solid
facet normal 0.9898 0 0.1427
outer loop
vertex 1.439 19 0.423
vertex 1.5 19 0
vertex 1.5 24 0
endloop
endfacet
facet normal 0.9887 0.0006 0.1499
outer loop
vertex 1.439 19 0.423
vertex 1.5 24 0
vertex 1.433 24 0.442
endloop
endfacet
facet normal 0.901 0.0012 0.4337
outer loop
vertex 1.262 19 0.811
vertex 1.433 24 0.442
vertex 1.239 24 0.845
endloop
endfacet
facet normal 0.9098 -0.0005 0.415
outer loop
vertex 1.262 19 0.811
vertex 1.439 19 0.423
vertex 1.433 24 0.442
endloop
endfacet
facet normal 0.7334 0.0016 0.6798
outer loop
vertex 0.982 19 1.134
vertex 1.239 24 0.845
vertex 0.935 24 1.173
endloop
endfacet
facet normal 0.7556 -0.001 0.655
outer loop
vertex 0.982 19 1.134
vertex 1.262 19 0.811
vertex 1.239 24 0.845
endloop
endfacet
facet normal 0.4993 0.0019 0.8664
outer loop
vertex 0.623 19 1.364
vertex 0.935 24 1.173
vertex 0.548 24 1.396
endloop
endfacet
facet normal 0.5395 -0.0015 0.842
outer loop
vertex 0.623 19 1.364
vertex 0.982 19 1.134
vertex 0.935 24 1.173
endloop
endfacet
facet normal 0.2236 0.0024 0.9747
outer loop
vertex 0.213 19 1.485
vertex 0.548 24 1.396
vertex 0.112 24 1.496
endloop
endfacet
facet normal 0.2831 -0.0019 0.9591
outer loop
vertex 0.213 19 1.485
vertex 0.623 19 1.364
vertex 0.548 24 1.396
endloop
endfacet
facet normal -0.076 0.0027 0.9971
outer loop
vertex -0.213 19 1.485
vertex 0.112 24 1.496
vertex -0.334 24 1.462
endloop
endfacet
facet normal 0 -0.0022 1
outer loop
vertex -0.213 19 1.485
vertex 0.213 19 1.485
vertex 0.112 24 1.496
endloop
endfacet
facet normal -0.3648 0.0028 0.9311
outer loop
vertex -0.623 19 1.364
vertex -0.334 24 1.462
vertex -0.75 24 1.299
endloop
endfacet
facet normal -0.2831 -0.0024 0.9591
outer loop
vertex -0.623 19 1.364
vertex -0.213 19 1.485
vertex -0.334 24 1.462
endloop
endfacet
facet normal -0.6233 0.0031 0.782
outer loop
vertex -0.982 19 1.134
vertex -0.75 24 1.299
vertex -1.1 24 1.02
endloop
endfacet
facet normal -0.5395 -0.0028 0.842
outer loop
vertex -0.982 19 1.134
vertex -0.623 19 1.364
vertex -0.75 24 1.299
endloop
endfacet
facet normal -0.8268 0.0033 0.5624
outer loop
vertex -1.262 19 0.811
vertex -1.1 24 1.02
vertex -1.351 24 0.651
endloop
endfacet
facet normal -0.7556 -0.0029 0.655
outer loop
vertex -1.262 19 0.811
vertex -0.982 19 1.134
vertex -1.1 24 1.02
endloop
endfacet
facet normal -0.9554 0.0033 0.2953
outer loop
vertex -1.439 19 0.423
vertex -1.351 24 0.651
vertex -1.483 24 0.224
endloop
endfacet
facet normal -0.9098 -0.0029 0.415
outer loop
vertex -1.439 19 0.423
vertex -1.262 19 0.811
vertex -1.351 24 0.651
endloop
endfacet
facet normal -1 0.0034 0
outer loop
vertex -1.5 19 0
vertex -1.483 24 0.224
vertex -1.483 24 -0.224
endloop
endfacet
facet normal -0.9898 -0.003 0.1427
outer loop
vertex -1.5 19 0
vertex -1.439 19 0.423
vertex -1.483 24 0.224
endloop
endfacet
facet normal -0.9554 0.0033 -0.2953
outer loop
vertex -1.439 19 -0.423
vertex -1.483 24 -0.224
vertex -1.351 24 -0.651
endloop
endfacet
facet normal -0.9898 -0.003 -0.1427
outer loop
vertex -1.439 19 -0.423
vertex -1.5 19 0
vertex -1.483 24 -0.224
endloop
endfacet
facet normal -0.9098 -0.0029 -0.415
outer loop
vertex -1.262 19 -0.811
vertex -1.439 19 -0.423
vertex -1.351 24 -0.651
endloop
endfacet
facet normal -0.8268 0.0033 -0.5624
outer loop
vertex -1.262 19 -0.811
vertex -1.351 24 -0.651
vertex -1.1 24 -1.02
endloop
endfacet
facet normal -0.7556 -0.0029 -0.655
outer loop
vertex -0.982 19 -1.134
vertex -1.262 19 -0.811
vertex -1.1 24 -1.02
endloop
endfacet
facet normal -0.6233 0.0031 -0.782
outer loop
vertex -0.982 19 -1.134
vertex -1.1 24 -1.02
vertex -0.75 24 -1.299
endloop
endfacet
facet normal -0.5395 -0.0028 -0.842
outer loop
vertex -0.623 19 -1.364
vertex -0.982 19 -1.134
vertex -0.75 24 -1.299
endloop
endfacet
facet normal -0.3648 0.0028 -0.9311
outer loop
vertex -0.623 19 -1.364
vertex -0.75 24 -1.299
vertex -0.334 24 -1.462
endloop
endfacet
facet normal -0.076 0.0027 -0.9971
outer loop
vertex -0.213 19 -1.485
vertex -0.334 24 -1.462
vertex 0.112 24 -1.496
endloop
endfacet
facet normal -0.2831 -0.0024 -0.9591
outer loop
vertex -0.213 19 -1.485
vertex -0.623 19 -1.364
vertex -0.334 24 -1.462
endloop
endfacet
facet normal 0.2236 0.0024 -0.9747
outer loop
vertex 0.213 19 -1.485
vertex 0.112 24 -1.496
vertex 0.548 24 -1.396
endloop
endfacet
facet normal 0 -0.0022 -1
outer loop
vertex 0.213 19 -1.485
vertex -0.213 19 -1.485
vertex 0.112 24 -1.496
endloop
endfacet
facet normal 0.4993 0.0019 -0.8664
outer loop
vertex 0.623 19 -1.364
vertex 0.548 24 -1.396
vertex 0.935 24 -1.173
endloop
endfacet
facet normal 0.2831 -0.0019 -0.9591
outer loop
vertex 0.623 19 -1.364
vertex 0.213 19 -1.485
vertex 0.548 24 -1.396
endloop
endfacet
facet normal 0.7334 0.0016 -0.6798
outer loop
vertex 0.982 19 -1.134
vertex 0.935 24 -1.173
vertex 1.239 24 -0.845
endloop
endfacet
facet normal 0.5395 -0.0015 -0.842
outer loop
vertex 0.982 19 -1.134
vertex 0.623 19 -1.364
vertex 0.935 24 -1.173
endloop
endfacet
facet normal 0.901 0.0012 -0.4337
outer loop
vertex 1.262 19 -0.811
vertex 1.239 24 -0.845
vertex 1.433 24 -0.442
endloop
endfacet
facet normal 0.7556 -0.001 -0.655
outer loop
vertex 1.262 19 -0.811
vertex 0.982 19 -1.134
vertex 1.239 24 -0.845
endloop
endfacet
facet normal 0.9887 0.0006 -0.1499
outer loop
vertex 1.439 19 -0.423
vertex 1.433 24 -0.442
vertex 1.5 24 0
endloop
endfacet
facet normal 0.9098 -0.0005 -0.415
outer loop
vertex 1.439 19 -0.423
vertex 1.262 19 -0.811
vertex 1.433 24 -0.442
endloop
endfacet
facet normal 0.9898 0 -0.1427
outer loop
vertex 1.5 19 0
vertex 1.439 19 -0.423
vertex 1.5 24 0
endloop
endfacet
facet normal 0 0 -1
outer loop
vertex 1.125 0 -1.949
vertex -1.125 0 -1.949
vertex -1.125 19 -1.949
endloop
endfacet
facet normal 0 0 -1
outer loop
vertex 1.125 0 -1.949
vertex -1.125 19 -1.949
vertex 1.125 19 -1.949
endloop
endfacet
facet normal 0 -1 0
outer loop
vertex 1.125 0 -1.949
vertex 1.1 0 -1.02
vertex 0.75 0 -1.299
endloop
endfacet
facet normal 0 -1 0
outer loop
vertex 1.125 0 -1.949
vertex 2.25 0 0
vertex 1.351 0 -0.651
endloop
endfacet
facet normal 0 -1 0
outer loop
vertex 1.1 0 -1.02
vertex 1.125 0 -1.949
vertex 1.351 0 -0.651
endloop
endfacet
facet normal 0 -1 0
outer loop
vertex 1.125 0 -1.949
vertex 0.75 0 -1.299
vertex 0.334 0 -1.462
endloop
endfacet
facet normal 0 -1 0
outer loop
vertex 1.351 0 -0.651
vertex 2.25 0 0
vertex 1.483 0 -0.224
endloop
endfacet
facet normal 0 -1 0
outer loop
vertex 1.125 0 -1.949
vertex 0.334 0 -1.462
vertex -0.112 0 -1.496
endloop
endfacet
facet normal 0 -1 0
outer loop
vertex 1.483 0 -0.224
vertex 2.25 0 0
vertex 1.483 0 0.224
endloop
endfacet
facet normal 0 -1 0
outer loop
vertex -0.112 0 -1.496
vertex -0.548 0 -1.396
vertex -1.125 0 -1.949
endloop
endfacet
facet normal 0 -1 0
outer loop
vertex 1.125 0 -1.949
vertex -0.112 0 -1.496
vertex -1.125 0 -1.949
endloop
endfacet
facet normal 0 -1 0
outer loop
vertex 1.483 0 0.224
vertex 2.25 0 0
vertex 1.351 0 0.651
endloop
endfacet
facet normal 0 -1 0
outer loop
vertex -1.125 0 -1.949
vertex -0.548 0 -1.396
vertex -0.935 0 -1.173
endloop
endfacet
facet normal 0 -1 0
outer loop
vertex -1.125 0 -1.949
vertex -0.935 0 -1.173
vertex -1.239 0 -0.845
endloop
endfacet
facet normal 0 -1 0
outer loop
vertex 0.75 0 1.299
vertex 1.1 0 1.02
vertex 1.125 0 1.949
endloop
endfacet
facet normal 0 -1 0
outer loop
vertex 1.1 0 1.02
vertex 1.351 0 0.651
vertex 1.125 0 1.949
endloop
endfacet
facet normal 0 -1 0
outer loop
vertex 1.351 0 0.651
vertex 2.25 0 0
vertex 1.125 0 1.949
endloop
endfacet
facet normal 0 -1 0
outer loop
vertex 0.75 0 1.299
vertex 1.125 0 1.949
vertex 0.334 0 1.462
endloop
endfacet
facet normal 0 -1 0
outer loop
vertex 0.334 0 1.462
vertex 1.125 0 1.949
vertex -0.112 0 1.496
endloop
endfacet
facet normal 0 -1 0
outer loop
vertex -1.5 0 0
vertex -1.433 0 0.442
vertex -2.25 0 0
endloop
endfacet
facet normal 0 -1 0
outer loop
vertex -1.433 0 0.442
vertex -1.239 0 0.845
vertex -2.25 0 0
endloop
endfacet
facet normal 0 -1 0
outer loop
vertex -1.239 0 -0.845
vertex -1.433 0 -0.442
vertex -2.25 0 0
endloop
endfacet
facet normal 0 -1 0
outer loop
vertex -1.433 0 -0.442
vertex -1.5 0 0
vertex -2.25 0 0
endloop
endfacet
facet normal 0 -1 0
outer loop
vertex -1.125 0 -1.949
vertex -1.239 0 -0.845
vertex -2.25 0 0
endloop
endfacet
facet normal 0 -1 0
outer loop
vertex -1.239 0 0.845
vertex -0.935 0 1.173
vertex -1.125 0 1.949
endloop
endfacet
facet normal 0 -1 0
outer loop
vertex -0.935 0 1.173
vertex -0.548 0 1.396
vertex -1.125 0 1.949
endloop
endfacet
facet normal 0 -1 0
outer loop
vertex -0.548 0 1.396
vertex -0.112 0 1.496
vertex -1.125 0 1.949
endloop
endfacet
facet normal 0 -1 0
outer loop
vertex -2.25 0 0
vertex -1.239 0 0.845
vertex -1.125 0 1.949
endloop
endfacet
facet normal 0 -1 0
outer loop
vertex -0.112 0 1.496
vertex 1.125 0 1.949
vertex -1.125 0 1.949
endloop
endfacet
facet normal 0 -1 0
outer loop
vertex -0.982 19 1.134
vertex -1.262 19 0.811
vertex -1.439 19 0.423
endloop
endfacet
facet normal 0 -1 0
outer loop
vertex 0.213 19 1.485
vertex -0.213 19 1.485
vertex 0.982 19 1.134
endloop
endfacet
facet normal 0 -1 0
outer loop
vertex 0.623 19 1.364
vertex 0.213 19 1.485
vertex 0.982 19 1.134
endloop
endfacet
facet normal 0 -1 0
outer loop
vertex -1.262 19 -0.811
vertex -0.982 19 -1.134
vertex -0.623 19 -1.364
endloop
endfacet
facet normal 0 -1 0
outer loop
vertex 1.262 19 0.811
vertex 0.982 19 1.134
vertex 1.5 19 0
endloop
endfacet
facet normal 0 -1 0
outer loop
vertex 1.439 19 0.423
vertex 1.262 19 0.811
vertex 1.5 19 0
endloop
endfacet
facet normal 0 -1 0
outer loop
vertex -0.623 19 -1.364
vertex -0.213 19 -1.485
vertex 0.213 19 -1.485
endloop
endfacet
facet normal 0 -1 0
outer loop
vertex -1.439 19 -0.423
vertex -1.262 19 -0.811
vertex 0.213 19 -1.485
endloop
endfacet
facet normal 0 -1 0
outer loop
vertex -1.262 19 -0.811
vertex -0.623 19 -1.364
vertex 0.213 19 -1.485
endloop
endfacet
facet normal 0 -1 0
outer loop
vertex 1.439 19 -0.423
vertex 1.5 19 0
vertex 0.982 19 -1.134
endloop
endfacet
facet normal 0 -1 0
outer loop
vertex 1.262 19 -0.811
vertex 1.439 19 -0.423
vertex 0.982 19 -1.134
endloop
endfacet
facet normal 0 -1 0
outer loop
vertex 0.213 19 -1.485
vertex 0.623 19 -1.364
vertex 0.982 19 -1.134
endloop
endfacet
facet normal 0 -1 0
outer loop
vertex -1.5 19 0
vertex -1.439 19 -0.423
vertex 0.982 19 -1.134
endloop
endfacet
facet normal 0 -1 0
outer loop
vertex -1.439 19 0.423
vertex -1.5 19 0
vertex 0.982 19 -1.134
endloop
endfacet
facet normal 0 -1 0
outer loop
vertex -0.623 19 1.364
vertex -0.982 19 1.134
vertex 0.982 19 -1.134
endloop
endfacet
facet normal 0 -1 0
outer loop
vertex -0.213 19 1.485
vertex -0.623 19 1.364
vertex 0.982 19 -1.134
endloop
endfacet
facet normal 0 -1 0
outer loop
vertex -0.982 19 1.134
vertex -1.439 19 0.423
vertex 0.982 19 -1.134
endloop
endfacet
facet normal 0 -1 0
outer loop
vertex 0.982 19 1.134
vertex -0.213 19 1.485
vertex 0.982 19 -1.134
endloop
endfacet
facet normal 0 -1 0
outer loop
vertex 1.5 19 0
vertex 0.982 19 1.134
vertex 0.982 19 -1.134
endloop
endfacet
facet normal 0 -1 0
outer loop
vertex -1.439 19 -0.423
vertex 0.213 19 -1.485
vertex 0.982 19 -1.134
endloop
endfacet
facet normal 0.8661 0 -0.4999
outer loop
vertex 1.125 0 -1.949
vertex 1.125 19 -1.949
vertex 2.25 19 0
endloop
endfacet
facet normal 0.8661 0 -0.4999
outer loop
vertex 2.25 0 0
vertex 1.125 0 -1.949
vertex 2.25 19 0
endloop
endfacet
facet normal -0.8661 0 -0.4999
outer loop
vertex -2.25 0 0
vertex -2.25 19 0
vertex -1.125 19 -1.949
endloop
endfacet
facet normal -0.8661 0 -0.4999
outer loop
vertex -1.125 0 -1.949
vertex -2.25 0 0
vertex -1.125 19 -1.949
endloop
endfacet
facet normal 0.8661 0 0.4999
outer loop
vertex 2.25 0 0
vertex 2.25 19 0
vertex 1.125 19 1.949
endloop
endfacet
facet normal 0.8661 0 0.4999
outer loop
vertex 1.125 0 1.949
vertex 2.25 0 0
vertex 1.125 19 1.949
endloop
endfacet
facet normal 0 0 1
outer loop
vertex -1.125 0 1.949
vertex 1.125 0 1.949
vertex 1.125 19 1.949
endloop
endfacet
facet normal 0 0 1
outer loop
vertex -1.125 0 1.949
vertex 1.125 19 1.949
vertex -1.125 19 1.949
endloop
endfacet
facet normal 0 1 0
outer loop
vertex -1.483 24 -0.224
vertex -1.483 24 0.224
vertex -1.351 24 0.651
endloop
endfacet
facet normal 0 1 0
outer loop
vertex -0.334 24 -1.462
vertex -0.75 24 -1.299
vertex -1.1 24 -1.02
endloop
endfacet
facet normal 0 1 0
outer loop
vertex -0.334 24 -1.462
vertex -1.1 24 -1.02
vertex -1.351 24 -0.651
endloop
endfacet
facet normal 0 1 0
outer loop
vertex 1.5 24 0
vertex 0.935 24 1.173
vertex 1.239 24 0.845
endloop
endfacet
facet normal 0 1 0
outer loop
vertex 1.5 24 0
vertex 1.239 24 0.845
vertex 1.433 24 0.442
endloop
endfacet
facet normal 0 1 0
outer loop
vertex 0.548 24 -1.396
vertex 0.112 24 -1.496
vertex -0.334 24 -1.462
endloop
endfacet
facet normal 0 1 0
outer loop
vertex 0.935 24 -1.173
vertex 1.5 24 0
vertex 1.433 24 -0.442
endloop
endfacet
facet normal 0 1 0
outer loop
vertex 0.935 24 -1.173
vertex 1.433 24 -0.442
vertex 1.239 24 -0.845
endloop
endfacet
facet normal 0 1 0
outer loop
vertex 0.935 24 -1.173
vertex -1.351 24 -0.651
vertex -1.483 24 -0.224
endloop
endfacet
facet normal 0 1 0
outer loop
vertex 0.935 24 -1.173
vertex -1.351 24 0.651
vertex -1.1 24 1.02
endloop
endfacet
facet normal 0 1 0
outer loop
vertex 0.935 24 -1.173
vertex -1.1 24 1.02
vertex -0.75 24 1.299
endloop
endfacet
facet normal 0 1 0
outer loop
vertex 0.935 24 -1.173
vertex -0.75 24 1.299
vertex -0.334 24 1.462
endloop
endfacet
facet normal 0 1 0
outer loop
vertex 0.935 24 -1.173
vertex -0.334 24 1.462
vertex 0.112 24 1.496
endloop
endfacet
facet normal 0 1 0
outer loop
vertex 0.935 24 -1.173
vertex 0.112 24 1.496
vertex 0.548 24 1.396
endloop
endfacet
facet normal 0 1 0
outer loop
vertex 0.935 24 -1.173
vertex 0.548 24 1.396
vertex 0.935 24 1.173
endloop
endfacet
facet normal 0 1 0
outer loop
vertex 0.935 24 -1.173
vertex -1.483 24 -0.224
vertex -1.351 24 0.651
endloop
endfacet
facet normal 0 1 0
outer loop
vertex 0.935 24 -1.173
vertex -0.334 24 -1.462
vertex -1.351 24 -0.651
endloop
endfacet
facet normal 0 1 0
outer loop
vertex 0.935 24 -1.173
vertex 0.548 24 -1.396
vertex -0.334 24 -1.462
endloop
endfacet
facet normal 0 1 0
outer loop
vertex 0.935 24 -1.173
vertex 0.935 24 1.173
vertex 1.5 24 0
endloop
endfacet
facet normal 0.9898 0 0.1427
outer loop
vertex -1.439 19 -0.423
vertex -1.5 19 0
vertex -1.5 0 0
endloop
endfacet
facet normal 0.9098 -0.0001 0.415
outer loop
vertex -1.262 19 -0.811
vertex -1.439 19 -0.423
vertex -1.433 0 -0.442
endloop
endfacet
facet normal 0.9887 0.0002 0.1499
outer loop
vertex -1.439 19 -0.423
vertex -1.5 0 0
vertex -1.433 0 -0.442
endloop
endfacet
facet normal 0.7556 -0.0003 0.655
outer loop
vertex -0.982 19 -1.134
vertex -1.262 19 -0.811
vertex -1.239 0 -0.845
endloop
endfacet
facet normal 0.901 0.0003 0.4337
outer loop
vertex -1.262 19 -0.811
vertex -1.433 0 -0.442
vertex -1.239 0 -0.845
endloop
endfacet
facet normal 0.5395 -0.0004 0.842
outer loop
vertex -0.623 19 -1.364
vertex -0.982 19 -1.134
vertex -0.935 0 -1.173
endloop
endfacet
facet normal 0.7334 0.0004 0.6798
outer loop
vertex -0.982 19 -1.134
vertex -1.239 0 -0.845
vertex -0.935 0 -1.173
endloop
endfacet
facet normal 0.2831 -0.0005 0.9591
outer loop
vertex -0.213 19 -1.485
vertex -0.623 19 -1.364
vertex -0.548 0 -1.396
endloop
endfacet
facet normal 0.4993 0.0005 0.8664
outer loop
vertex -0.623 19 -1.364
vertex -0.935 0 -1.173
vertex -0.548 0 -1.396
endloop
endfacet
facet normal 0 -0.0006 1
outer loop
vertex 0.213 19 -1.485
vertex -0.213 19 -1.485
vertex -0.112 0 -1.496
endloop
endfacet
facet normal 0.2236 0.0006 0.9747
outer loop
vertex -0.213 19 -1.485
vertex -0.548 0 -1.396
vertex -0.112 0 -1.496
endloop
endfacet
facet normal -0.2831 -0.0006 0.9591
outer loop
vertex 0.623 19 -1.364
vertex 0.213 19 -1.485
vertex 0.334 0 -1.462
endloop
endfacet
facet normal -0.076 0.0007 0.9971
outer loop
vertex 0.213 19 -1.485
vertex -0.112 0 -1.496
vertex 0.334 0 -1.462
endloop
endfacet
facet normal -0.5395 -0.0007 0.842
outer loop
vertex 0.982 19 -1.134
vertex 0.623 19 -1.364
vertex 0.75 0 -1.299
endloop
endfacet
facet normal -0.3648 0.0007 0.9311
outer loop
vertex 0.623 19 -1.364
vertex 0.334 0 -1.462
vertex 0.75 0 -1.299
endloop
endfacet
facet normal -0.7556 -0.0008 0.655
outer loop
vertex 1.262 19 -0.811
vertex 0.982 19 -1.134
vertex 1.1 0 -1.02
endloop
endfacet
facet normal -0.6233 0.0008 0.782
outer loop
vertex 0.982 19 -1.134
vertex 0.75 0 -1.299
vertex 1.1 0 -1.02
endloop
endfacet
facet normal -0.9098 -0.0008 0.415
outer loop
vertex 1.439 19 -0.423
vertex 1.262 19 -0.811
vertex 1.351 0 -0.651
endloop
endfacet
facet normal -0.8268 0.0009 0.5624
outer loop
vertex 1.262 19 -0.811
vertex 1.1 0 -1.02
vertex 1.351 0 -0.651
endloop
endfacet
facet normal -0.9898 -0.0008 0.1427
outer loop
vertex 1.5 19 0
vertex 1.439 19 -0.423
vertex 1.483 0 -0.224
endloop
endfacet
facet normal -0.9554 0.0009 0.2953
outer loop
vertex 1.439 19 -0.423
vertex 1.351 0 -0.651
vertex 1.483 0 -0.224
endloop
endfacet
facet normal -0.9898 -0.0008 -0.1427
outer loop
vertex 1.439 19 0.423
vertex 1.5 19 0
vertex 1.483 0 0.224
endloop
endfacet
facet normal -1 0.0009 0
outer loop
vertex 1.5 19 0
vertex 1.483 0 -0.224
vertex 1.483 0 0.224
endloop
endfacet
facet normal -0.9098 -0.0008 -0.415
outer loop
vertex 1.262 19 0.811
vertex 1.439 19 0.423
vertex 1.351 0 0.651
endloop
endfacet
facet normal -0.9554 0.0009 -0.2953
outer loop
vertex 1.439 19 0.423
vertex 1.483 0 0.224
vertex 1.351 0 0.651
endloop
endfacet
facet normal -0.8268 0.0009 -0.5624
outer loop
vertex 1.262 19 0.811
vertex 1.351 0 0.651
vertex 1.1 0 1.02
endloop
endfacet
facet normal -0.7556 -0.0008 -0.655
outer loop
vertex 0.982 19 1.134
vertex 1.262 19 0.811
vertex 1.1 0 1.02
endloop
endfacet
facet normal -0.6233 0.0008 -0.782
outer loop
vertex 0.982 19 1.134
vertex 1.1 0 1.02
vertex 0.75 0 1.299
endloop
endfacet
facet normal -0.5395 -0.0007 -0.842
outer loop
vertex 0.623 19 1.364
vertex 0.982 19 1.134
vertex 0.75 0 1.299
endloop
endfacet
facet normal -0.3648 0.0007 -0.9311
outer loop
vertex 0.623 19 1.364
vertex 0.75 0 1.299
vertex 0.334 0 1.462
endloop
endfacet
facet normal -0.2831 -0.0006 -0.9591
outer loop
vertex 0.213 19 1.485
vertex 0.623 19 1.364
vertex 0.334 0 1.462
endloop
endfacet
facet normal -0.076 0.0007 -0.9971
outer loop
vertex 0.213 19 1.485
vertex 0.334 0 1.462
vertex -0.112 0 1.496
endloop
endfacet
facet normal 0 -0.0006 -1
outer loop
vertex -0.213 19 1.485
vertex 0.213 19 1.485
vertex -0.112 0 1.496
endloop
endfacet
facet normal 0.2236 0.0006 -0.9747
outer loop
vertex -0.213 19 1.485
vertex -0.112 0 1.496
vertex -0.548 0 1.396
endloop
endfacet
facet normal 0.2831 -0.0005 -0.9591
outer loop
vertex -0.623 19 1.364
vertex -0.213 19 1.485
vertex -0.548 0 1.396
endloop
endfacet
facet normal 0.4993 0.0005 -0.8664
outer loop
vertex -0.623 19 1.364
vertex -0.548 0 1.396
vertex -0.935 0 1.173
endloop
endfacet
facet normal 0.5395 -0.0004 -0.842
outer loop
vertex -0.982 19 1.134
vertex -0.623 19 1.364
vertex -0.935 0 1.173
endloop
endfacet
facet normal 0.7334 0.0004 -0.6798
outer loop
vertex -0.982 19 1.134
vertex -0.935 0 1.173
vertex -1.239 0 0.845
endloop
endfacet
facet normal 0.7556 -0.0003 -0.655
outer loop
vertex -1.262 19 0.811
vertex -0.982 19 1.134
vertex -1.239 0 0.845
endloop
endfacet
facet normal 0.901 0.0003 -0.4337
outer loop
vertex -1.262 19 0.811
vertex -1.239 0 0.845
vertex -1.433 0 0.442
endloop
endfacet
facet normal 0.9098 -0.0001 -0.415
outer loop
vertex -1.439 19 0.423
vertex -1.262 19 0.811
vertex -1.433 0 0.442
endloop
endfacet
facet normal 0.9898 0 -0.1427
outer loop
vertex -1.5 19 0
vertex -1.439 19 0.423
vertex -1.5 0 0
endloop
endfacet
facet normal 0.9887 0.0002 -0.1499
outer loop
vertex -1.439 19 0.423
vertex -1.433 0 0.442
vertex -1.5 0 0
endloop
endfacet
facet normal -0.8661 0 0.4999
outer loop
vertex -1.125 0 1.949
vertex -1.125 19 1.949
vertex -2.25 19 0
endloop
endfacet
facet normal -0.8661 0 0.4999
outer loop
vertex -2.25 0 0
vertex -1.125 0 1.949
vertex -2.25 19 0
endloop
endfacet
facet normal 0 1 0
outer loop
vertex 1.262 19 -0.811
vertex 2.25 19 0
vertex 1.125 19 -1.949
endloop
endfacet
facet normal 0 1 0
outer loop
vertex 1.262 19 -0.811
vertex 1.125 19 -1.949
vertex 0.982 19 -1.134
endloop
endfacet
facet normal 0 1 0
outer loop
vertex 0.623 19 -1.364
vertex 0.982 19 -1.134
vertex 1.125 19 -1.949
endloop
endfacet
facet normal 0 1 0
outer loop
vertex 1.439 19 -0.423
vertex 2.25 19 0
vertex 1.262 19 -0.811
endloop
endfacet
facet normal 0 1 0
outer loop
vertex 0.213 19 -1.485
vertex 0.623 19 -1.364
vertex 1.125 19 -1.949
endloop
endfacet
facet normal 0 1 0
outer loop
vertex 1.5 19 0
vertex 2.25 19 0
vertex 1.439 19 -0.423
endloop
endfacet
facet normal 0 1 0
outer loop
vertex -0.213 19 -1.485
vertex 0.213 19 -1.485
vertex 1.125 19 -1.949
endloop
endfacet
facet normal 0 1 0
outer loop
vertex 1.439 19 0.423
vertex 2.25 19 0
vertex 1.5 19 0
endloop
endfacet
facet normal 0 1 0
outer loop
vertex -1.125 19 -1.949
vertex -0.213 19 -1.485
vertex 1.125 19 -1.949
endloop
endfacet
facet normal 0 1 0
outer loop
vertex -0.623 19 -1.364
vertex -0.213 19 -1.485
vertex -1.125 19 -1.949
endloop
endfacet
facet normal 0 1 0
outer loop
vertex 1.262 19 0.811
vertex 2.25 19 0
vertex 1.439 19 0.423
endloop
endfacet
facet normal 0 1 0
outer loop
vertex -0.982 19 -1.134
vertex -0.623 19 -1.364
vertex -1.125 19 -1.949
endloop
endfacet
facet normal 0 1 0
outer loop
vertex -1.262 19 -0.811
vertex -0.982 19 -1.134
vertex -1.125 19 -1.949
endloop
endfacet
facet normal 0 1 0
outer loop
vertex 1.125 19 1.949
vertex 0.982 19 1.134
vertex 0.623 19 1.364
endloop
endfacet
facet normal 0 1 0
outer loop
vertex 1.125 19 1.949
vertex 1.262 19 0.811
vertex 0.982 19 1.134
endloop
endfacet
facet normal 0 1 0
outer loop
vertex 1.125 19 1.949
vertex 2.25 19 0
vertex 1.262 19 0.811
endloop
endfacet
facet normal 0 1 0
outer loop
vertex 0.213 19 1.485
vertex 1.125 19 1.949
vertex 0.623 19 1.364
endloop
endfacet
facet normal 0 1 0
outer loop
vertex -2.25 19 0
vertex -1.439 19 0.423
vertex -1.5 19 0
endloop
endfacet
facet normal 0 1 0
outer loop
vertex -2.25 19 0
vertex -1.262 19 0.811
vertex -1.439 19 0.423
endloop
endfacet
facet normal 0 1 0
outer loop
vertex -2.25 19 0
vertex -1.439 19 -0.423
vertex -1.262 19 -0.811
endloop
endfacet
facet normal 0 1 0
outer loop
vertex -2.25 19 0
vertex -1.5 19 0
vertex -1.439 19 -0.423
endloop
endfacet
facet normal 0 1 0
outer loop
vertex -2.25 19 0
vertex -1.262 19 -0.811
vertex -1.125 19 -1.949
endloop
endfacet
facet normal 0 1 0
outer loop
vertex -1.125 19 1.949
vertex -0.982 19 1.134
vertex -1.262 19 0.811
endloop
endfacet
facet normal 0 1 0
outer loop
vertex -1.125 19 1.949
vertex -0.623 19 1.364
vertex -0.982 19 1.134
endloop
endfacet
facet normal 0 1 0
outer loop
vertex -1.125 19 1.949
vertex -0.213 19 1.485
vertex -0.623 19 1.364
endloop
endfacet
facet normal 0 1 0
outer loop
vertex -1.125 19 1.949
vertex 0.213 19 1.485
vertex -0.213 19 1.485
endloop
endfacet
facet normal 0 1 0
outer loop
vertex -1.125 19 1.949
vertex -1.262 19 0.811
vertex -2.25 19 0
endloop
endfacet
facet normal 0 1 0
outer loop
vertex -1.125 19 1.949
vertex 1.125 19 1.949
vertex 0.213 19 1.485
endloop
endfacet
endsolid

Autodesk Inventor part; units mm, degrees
ref_plane "YZ Plane" through (0, 0, 0) normal (1, 0, 0) x (0, 1, 0)
ref_plane "XZ Plane" through (0, 0, 0) normal (0, 1, 0) x (-1, 0, 0)
ref_plane "XY Plane" through (0, 0, 0) normal (0, 0, 1) x (1, 0, 0)
sketch "Sketch1" plane through (0, 0, 0) normal (0, 1, 0) x (-1, 0, 0)
  circle A0 centre (0, 0) radius 1.5
  circle A1 centre (0, 0) radius 2.25 construction
  line L0 (2.25, 0) -> (1.125, -1.9486)
  line L1 (1.125, -1.9486) -> (-1.125, -1.9486)
  line L2 (-1.125, -1.9486) -> (-2.25, 0)
  line L3 (-2.25, 0) -> (-1.125, 1.9486)
  line L4 (-1.125, 1.9486) -> (1.125, 1.9486)
  line L5 (1.125, 1.9486) -> (2.25, 0)
  dimension "d3" = 4.5
  dimension "d0" = 3
extrude "Extrusion1" add sketch "Sketch1" along normal blind 19
sketch "Sketch2" plane through (0, 19, 0) normal (0, 1, 0) x (1, 0, 0)
  circle A0 centre (0, 0) radius 1.5 projected
extrude "Extrusion2" add sketch "Sketch2" along normal blind 5
properties part number "19mmStandoff"
